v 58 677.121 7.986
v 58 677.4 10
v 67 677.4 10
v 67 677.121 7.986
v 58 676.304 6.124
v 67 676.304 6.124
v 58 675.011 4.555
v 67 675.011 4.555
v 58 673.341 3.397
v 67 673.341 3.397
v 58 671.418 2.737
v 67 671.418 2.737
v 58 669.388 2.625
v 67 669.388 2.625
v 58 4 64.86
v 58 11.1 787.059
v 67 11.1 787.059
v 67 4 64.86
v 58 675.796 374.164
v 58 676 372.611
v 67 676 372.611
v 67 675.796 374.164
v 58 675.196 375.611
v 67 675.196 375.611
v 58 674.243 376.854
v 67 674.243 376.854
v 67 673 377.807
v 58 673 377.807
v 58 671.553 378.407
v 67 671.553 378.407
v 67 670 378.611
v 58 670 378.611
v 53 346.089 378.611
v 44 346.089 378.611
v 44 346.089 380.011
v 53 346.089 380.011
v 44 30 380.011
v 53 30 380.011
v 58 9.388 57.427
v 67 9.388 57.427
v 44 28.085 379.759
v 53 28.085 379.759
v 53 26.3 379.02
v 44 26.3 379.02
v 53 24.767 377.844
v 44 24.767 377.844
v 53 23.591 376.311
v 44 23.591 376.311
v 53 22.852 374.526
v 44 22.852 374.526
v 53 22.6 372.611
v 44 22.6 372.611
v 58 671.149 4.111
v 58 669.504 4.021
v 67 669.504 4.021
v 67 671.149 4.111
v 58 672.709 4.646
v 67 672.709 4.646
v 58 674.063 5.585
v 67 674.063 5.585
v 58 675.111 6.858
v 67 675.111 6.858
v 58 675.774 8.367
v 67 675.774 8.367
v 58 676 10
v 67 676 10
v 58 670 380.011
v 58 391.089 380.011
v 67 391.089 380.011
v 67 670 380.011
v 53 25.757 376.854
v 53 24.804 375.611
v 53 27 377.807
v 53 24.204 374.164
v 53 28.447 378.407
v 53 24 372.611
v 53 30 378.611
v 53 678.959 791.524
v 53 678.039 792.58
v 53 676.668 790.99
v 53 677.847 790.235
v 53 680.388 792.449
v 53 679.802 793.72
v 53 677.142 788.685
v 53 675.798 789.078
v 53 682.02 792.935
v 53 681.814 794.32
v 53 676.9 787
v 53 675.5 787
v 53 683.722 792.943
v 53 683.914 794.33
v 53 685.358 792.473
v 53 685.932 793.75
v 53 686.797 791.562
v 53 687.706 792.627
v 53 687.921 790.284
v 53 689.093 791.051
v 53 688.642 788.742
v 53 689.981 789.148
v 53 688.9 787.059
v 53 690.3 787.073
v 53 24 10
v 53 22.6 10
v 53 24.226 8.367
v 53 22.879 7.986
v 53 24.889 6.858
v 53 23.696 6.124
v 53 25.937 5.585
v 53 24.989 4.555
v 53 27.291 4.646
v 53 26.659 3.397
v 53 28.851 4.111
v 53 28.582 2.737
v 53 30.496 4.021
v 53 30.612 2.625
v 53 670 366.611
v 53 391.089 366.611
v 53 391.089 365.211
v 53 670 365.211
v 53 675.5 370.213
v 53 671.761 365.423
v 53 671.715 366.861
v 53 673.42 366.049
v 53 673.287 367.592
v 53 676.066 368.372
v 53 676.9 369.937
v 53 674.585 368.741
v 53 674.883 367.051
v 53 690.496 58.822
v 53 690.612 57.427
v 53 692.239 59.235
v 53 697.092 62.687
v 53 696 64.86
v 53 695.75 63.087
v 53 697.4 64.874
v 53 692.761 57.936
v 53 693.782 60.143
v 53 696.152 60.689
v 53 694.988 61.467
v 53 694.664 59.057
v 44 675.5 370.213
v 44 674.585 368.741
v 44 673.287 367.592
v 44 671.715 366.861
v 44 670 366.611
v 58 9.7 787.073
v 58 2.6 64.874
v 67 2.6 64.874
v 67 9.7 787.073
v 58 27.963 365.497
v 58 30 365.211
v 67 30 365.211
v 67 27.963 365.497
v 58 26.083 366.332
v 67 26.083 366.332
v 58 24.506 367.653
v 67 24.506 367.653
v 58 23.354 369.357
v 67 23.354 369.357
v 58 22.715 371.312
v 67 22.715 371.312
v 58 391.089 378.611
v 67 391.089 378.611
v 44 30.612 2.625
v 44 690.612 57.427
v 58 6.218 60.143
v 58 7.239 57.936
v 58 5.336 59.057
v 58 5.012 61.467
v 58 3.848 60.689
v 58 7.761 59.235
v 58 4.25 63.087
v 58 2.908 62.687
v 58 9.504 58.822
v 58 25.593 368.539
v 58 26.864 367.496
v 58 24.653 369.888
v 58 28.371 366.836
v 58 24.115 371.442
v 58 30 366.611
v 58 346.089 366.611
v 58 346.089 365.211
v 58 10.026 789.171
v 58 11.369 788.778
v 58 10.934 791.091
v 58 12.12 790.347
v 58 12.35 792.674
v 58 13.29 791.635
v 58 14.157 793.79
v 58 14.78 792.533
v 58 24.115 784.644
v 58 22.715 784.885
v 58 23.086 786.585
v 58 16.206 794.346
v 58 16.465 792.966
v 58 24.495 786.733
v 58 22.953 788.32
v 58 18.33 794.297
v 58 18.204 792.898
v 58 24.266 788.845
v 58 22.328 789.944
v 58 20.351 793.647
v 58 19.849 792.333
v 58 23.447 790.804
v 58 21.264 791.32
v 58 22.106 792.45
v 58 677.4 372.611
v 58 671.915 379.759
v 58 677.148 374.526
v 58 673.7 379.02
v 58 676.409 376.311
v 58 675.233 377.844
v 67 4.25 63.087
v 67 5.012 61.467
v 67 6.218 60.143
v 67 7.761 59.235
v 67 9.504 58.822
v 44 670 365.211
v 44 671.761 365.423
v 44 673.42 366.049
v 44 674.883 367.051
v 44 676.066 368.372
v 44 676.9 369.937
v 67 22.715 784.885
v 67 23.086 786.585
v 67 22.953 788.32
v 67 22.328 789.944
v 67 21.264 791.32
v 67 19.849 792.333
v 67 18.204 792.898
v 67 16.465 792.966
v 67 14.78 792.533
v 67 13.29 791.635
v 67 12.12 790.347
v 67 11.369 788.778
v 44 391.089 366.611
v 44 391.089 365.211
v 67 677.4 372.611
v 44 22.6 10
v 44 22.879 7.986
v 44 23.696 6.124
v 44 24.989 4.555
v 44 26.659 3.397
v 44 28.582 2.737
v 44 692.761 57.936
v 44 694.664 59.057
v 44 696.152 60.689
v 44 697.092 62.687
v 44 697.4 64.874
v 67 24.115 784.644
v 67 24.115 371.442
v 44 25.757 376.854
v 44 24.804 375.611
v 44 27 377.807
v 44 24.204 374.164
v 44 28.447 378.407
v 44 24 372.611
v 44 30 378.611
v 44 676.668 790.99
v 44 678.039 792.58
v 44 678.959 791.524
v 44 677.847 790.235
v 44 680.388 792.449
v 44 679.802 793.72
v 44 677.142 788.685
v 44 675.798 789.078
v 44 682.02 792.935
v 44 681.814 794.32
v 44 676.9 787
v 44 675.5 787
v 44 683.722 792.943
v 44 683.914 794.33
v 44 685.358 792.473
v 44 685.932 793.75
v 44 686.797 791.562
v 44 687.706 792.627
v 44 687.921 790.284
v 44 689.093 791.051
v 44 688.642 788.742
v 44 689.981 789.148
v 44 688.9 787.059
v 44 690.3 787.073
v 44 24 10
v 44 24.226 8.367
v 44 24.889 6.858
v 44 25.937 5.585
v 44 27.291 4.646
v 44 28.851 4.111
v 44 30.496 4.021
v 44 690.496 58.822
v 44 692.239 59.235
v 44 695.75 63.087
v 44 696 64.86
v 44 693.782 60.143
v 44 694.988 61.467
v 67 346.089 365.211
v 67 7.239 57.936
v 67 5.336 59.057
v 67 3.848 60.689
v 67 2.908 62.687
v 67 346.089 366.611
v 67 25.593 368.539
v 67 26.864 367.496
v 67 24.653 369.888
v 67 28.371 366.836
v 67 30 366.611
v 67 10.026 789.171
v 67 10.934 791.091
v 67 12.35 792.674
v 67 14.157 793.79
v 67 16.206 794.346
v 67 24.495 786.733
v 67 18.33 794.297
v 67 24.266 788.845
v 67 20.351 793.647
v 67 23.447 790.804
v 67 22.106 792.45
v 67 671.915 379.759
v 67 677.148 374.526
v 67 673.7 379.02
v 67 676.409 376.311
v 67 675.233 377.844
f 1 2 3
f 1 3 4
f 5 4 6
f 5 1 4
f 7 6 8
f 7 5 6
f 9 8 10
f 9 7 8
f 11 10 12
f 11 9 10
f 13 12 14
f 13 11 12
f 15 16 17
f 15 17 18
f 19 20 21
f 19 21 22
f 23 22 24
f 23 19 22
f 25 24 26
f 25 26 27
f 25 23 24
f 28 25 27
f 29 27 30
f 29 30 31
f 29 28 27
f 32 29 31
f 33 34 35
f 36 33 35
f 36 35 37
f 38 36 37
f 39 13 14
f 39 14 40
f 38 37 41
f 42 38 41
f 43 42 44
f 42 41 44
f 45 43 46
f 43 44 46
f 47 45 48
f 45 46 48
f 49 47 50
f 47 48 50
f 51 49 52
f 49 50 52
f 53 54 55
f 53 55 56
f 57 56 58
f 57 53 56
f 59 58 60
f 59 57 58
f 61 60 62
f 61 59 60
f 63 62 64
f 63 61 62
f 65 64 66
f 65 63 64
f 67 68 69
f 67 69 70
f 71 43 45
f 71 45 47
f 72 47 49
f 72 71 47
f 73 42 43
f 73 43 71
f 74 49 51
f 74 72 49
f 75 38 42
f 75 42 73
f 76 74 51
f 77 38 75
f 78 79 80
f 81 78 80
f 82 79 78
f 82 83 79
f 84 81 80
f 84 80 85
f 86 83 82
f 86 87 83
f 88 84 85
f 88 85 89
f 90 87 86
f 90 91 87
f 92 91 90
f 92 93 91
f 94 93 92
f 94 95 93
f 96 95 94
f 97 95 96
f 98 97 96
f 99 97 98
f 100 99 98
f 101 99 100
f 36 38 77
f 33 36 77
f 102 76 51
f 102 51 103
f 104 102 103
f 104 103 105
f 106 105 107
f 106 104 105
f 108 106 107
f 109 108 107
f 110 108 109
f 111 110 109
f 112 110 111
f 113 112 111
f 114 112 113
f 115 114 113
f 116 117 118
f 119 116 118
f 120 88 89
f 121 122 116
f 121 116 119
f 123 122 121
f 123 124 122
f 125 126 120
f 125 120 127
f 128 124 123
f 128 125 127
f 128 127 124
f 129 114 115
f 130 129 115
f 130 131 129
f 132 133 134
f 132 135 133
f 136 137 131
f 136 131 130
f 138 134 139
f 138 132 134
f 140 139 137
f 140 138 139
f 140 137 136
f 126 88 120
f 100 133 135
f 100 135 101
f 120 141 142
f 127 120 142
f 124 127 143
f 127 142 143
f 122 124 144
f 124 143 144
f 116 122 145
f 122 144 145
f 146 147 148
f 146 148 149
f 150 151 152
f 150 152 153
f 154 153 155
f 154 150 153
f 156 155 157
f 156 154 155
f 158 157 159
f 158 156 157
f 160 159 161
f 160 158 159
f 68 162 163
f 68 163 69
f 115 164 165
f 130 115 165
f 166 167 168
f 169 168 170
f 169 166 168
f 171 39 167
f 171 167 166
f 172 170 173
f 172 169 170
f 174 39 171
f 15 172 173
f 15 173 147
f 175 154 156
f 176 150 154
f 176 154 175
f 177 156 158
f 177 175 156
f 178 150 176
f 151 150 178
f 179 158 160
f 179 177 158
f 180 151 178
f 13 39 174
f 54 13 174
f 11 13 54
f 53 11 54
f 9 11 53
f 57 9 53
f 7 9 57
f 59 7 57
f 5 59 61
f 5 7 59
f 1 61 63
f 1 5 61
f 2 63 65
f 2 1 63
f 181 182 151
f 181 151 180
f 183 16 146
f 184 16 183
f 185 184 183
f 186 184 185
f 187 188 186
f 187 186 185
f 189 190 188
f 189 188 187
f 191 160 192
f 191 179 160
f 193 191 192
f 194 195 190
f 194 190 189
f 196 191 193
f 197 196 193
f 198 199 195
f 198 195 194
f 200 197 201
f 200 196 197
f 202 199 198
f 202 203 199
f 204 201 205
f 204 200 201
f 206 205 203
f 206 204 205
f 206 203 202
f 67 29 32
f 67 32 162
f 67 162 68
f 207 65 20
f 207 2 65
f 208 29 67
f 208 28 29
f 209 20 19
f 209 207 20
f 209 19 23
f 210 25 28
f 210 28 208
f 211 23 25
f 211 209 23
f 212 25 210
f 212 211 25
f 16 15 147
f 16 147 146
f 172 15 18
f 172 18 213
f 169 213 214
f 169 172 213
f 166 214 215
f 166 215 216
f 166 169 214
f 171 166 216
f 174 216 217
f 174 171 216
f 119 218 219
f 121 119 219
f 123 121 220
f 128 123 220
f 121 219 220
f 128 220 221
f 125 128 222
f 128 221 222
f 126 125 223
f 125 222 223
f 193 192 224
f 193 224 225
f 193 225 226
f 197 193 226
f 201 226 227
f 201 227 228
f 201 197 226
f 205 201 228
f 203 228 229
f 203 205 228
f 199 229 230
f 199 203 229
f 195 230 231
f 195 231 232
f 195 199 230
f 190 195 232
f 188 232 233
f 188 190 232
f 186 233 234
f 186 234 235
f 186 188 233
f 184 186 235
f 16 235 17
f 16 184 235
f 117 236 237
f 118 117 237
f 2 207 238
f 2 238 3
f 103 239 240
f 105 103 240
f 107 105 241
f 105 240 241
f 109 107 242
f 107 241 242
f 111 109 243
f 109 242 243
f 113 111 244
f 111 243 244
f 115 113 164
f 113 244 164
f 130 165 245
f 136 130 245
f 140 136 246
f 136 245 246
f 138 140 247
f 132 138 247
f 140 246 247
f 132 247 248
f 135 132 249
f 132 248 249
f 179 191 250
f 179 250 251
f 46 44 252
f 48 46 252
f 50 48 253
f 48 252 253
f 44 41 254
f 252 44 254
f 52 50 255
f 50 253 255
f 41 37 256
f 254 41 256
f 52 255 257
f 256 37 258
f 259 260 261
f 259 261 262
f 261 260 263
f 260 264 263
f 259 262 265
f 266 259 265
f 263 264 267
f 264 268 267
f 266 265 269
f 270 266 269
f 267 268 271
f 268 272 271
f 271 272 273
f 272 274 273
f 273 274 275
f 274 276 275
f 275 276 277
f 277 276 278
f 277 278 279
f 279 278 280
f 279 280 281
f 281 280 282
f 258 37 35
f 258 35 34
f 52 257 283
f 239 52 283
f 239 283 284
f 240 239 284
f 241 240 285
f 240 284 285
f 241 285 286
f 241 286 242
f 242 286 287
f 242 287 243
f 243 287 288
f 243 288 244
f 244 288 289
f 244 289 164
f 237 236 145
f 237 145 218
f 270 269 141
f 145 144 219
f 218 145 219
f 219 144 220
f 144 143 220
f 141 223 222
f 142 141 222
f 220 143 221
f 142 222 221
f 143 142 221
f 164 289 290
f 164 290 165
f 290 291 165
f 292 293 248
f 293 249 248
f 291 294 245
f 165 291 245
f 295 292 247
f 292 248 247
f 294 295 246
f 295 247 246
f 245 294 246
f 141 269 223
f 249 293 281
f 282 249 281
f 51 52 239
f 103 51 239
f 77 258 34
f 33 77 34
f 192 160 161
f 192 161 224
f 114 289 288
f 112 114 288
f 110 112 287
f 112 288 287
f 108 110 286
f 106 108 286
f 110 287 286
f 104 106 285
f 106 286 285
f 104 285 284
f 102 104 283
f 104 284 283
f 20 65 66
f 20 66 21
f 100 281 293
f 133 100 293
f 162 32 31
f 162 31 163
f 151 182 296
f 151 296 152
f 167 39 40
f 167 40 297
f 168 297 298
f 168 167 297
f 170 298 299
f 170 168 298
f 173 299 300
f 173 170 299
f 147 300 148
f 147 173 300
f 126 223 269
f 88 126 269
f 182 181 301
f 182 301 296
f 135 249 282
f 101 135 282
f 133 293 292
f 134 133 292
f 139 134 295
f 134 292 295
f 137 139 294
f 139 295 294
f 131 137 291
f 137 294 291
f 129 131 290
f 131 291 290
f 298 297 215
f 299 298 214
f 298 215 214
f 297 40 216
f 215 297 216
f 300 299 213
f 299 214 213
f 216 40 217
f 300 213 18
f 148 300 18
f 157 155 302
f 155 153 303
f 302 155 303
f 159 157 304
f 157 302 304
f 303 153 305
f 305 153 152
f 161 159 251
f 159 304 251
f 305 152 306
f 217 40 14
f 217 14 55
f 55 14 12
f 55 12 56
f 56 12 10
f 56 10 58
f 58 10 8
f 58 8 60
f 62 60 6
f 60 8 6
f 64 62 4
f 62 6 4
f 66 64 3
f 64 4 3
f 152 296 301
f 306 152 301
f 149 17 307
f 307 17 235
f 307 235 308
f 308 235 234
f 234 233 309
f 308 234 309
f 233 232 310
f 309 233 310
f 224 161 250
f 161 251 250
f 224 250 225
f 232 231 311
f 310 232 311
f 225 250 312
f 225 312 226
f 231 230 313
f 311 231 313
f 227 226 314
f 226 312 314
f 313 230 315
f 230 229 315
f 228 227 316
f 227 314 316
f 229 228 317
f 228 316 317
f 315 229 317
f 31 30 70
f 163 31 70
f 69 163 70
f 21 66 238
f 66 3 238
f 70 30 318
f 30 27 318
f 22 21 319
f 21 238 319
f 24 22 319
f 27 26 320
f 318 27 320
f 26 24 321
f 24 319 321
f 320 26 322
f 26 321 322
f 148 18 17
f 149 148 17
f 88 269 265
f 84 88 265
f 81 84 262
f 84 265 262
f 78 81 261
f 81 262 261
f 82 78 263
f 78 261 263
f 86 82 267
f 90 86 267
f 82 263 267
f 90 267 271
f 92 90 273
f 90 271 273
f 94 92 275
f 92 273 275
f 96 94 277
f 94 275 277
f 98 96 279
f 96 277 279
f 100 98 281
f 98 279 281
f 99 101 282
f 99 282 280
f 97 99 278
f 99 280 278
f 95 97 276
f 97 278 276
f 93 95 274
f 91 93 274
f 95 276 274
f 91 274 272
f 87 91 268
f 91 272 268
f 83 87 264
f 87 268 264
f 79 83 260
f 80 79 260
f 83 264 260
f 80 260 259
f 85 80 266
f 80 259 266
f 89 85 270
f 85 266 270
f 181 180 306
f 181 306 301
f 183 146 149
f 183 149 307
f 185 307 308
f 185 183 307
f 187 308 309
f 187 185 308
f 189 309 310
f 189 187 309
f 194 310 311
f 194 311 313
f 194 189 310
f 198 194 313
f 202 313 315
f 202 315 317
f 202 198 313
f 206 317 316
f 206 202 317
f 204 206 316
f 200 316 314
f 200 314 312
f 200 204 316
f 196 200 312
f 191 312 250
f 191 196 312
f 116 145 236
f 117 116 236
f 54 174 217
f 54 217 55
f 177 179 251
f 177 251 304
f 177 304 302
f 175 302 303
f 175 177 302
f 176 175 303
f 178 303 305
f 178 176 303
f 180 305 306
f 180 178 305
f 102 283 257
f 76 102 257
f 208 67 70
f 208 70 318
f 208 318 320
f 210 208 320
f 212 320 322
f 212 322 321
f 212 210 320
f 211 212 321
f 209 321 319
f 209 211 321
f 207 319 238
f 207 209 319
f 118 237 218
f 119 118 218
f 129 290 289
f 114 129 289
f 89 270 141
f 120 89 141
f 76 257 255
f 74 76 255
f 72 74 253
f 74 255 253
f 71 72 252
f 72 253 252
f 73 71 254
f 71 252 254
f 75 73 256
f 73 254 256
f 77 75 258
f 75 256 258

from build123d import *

# Parameters (mm, degrees)
EXTRUDE_START   = 1
EXTRUDE_1_DEPTH = 9
EXTRUDE_2_DEPTH = 9


with BuildPart() as part:
    # Эскиз1 → Вытянуть-Тонкостенный1 (new body)
    with BuildSketch(Plane(origin=(43, 0, 0), x_dir=(0, 0, -1), z_dir=(1, 0, 0)).offset(EXTRUDE_START)):
        with BuildLine():
            Line((-365.210954527, 391.088904873), (-365.210954527, 670))
            ThreePointArc((-365.210954527, 670), (-366.505742897, 674.181673224), (-369.937006136, 676.9))
            Line((-369.937006136, 676.9), (-787, 676.9))
            ThreePointArc((-787, 676.9), (-792.999927517, 682.870507794), (-787.0589837, 688.89971007))
            Line((-787.0589837, 688.89971007), (-64.860447413, 695.99971007))
            ThreePointArc((-64.860447413, 695.99971007), (-60.759896196, 694.434606184), (-58.822040574, 690.496486576))
            Line((-58.822040574, 690.496486576), (-4.020576861, 30.496486576))
            ThreePointArc((-4.020576861, 30.496486576), (-5.585313179, 25.936683587), (-10, 24))
            Line((-10, 24), (-372.610954527, 24))
            ThreePointArc((-372.610954527, 24), (-376.853595214, 25.757359313), (-378.610954527, 30))
            Line((-378.610954527, 30), (-378.610954527, 346.088904873))
            Line((-378.610954527, 346.088904873), (-380.010954527, 346.088904873))
            Line((-380.010954527, 346.088904873), (-380.010954527, 30))
            ThreePointArc((-380.010954527, 30), (-377.843544708, 24.767409819), (-372.610954527, 22.6))
            Line((-372.610954527, 22.6), (-10, 22.6))
            ThreePointArc((-10, 22.6), (-4.555219587, 24.988576424), (-2.625378128, 30.612333444))
            Line((-2.625378128, 30.612333444), (-57.426841842, 690.612333444))
            ThreePointArc((-57.426841842, 690.612333444), (-59.816863776, 695.469347626), (-64.874210276, 697.39964242))
            Line((-64.874210276, 697.39964242), (-787.072746563, 690.29964242))
            ThreePointArc((-787.072746563, 690.29964242), (-794.399910604, 682.863626279), (-787, 675.5))
            Line((-787, 675.5), (-370.213038765, 675.5))
            ThreePointArc((-370.213038765, 675.5), (-367.591617192, 673.287286528), (-366.610954527, 670))
            Line((-366.610954527, 670), (-366.610954527, 391.088904873))
            Line((-366.610954527, 391.088904873), (-365.210954527, 391.088904873))
        make_face()
    extrude(amount=EXTRUDE_1_DEPTH)


with BuildPart() as body_2:
    # Эскиз2 → Вытянуть-Тонкостенный2 (new body)
    with BuildSketch(Plane(origin=(57, 0, 0), x_dir=(0, 0, -1), z_dir=(1, 0, 0)).offset(EXTRUDE_START)):
        with BuildLine():
            Line((-365.210954527, 346.088904873), (-365.210954527, 30))
            ThreePointArc((-365.210954527, 30), (-366.937621008, 25.248864685), (-371.311842847, 22.714925612))
            Line((-371.311842847, 22.714925612), (-784.885145307, 22.714925612))
            ThreePointArc((-784.885145307, 22.714925612), (-792.897592042, 18.203815252), (-787.0589837, 11.10028993))
            Line((-787.0589837, 11.10028993), (-64.860447413, 4.00028993))
            ThreePointArc((-64.860447413, 4.00028993), (-60.759896196, 5.565393816), (-58.822040574, 9.503513424))
            Line((-58.822040574, 9.503513424), (-4.020576861, 669.503513424))
            ThreePointArc((-4.020576861, 669.503513424), (-5.585313179, 674.063316413), (-10, 676))
            Line((-10, 676), (-372.610954527, 676))
            ThreePointArc((-372.610954527, 676), (-376.853595214, 674.242640687), (-378.610954527, 670))
            Line((-378.610954527, 670), (-378.610954527, 391.088904873))
            Line((-378.610954527, 391.088904873), (-380.010954527, 391.088904873))
            Line((-380.010954527, 391.088904873), (-380.010954527, 670))
            ThreePointArc((-380.010954527, 670), (-377.843544708, 675.232590181), (-372.610954527, 677.4))
            Line((-372.610954527, 677.4), (-10, 677.4))
            ThreePointArc((-10, 677.4), (-4.555219587, 675.011423576), (-2.625378128, 669.387666556))
            Line((-2.625378128, 669.387666556), (-57.426841842, 9.387666556))
            ThreePointArc((-57.426841842, 9.387666556), (-59.816863776, 4.530652374), (-64.874210276, 2.60035758))
            Line((-64.874210276, 2.60035758), (-787.072746563, 9.70035758))
            ThreePointArc((-787.072746563, 9.70035758), (-794.297141528, 18.329522479), (-784.643982457, 24.114925612))
            Line((-784.643982457, 24.114925612), (-371.442237519, 24.114925612))
            ThreePointArc((-371.442237519, 24.114925612), (-367.973482045, 26.192921202), (-366.610954527, 30))
            Line((-366.610954527, 30), (-366.610954527, 346.088904873))
            Line((-366.610954527, 346.088904873), (-365.210954527, 346.088904873))
        make_face()
    extrude(amount=EXTRUDE_2_DEPTH)


solid = Compound([part.part, body_2.part])
